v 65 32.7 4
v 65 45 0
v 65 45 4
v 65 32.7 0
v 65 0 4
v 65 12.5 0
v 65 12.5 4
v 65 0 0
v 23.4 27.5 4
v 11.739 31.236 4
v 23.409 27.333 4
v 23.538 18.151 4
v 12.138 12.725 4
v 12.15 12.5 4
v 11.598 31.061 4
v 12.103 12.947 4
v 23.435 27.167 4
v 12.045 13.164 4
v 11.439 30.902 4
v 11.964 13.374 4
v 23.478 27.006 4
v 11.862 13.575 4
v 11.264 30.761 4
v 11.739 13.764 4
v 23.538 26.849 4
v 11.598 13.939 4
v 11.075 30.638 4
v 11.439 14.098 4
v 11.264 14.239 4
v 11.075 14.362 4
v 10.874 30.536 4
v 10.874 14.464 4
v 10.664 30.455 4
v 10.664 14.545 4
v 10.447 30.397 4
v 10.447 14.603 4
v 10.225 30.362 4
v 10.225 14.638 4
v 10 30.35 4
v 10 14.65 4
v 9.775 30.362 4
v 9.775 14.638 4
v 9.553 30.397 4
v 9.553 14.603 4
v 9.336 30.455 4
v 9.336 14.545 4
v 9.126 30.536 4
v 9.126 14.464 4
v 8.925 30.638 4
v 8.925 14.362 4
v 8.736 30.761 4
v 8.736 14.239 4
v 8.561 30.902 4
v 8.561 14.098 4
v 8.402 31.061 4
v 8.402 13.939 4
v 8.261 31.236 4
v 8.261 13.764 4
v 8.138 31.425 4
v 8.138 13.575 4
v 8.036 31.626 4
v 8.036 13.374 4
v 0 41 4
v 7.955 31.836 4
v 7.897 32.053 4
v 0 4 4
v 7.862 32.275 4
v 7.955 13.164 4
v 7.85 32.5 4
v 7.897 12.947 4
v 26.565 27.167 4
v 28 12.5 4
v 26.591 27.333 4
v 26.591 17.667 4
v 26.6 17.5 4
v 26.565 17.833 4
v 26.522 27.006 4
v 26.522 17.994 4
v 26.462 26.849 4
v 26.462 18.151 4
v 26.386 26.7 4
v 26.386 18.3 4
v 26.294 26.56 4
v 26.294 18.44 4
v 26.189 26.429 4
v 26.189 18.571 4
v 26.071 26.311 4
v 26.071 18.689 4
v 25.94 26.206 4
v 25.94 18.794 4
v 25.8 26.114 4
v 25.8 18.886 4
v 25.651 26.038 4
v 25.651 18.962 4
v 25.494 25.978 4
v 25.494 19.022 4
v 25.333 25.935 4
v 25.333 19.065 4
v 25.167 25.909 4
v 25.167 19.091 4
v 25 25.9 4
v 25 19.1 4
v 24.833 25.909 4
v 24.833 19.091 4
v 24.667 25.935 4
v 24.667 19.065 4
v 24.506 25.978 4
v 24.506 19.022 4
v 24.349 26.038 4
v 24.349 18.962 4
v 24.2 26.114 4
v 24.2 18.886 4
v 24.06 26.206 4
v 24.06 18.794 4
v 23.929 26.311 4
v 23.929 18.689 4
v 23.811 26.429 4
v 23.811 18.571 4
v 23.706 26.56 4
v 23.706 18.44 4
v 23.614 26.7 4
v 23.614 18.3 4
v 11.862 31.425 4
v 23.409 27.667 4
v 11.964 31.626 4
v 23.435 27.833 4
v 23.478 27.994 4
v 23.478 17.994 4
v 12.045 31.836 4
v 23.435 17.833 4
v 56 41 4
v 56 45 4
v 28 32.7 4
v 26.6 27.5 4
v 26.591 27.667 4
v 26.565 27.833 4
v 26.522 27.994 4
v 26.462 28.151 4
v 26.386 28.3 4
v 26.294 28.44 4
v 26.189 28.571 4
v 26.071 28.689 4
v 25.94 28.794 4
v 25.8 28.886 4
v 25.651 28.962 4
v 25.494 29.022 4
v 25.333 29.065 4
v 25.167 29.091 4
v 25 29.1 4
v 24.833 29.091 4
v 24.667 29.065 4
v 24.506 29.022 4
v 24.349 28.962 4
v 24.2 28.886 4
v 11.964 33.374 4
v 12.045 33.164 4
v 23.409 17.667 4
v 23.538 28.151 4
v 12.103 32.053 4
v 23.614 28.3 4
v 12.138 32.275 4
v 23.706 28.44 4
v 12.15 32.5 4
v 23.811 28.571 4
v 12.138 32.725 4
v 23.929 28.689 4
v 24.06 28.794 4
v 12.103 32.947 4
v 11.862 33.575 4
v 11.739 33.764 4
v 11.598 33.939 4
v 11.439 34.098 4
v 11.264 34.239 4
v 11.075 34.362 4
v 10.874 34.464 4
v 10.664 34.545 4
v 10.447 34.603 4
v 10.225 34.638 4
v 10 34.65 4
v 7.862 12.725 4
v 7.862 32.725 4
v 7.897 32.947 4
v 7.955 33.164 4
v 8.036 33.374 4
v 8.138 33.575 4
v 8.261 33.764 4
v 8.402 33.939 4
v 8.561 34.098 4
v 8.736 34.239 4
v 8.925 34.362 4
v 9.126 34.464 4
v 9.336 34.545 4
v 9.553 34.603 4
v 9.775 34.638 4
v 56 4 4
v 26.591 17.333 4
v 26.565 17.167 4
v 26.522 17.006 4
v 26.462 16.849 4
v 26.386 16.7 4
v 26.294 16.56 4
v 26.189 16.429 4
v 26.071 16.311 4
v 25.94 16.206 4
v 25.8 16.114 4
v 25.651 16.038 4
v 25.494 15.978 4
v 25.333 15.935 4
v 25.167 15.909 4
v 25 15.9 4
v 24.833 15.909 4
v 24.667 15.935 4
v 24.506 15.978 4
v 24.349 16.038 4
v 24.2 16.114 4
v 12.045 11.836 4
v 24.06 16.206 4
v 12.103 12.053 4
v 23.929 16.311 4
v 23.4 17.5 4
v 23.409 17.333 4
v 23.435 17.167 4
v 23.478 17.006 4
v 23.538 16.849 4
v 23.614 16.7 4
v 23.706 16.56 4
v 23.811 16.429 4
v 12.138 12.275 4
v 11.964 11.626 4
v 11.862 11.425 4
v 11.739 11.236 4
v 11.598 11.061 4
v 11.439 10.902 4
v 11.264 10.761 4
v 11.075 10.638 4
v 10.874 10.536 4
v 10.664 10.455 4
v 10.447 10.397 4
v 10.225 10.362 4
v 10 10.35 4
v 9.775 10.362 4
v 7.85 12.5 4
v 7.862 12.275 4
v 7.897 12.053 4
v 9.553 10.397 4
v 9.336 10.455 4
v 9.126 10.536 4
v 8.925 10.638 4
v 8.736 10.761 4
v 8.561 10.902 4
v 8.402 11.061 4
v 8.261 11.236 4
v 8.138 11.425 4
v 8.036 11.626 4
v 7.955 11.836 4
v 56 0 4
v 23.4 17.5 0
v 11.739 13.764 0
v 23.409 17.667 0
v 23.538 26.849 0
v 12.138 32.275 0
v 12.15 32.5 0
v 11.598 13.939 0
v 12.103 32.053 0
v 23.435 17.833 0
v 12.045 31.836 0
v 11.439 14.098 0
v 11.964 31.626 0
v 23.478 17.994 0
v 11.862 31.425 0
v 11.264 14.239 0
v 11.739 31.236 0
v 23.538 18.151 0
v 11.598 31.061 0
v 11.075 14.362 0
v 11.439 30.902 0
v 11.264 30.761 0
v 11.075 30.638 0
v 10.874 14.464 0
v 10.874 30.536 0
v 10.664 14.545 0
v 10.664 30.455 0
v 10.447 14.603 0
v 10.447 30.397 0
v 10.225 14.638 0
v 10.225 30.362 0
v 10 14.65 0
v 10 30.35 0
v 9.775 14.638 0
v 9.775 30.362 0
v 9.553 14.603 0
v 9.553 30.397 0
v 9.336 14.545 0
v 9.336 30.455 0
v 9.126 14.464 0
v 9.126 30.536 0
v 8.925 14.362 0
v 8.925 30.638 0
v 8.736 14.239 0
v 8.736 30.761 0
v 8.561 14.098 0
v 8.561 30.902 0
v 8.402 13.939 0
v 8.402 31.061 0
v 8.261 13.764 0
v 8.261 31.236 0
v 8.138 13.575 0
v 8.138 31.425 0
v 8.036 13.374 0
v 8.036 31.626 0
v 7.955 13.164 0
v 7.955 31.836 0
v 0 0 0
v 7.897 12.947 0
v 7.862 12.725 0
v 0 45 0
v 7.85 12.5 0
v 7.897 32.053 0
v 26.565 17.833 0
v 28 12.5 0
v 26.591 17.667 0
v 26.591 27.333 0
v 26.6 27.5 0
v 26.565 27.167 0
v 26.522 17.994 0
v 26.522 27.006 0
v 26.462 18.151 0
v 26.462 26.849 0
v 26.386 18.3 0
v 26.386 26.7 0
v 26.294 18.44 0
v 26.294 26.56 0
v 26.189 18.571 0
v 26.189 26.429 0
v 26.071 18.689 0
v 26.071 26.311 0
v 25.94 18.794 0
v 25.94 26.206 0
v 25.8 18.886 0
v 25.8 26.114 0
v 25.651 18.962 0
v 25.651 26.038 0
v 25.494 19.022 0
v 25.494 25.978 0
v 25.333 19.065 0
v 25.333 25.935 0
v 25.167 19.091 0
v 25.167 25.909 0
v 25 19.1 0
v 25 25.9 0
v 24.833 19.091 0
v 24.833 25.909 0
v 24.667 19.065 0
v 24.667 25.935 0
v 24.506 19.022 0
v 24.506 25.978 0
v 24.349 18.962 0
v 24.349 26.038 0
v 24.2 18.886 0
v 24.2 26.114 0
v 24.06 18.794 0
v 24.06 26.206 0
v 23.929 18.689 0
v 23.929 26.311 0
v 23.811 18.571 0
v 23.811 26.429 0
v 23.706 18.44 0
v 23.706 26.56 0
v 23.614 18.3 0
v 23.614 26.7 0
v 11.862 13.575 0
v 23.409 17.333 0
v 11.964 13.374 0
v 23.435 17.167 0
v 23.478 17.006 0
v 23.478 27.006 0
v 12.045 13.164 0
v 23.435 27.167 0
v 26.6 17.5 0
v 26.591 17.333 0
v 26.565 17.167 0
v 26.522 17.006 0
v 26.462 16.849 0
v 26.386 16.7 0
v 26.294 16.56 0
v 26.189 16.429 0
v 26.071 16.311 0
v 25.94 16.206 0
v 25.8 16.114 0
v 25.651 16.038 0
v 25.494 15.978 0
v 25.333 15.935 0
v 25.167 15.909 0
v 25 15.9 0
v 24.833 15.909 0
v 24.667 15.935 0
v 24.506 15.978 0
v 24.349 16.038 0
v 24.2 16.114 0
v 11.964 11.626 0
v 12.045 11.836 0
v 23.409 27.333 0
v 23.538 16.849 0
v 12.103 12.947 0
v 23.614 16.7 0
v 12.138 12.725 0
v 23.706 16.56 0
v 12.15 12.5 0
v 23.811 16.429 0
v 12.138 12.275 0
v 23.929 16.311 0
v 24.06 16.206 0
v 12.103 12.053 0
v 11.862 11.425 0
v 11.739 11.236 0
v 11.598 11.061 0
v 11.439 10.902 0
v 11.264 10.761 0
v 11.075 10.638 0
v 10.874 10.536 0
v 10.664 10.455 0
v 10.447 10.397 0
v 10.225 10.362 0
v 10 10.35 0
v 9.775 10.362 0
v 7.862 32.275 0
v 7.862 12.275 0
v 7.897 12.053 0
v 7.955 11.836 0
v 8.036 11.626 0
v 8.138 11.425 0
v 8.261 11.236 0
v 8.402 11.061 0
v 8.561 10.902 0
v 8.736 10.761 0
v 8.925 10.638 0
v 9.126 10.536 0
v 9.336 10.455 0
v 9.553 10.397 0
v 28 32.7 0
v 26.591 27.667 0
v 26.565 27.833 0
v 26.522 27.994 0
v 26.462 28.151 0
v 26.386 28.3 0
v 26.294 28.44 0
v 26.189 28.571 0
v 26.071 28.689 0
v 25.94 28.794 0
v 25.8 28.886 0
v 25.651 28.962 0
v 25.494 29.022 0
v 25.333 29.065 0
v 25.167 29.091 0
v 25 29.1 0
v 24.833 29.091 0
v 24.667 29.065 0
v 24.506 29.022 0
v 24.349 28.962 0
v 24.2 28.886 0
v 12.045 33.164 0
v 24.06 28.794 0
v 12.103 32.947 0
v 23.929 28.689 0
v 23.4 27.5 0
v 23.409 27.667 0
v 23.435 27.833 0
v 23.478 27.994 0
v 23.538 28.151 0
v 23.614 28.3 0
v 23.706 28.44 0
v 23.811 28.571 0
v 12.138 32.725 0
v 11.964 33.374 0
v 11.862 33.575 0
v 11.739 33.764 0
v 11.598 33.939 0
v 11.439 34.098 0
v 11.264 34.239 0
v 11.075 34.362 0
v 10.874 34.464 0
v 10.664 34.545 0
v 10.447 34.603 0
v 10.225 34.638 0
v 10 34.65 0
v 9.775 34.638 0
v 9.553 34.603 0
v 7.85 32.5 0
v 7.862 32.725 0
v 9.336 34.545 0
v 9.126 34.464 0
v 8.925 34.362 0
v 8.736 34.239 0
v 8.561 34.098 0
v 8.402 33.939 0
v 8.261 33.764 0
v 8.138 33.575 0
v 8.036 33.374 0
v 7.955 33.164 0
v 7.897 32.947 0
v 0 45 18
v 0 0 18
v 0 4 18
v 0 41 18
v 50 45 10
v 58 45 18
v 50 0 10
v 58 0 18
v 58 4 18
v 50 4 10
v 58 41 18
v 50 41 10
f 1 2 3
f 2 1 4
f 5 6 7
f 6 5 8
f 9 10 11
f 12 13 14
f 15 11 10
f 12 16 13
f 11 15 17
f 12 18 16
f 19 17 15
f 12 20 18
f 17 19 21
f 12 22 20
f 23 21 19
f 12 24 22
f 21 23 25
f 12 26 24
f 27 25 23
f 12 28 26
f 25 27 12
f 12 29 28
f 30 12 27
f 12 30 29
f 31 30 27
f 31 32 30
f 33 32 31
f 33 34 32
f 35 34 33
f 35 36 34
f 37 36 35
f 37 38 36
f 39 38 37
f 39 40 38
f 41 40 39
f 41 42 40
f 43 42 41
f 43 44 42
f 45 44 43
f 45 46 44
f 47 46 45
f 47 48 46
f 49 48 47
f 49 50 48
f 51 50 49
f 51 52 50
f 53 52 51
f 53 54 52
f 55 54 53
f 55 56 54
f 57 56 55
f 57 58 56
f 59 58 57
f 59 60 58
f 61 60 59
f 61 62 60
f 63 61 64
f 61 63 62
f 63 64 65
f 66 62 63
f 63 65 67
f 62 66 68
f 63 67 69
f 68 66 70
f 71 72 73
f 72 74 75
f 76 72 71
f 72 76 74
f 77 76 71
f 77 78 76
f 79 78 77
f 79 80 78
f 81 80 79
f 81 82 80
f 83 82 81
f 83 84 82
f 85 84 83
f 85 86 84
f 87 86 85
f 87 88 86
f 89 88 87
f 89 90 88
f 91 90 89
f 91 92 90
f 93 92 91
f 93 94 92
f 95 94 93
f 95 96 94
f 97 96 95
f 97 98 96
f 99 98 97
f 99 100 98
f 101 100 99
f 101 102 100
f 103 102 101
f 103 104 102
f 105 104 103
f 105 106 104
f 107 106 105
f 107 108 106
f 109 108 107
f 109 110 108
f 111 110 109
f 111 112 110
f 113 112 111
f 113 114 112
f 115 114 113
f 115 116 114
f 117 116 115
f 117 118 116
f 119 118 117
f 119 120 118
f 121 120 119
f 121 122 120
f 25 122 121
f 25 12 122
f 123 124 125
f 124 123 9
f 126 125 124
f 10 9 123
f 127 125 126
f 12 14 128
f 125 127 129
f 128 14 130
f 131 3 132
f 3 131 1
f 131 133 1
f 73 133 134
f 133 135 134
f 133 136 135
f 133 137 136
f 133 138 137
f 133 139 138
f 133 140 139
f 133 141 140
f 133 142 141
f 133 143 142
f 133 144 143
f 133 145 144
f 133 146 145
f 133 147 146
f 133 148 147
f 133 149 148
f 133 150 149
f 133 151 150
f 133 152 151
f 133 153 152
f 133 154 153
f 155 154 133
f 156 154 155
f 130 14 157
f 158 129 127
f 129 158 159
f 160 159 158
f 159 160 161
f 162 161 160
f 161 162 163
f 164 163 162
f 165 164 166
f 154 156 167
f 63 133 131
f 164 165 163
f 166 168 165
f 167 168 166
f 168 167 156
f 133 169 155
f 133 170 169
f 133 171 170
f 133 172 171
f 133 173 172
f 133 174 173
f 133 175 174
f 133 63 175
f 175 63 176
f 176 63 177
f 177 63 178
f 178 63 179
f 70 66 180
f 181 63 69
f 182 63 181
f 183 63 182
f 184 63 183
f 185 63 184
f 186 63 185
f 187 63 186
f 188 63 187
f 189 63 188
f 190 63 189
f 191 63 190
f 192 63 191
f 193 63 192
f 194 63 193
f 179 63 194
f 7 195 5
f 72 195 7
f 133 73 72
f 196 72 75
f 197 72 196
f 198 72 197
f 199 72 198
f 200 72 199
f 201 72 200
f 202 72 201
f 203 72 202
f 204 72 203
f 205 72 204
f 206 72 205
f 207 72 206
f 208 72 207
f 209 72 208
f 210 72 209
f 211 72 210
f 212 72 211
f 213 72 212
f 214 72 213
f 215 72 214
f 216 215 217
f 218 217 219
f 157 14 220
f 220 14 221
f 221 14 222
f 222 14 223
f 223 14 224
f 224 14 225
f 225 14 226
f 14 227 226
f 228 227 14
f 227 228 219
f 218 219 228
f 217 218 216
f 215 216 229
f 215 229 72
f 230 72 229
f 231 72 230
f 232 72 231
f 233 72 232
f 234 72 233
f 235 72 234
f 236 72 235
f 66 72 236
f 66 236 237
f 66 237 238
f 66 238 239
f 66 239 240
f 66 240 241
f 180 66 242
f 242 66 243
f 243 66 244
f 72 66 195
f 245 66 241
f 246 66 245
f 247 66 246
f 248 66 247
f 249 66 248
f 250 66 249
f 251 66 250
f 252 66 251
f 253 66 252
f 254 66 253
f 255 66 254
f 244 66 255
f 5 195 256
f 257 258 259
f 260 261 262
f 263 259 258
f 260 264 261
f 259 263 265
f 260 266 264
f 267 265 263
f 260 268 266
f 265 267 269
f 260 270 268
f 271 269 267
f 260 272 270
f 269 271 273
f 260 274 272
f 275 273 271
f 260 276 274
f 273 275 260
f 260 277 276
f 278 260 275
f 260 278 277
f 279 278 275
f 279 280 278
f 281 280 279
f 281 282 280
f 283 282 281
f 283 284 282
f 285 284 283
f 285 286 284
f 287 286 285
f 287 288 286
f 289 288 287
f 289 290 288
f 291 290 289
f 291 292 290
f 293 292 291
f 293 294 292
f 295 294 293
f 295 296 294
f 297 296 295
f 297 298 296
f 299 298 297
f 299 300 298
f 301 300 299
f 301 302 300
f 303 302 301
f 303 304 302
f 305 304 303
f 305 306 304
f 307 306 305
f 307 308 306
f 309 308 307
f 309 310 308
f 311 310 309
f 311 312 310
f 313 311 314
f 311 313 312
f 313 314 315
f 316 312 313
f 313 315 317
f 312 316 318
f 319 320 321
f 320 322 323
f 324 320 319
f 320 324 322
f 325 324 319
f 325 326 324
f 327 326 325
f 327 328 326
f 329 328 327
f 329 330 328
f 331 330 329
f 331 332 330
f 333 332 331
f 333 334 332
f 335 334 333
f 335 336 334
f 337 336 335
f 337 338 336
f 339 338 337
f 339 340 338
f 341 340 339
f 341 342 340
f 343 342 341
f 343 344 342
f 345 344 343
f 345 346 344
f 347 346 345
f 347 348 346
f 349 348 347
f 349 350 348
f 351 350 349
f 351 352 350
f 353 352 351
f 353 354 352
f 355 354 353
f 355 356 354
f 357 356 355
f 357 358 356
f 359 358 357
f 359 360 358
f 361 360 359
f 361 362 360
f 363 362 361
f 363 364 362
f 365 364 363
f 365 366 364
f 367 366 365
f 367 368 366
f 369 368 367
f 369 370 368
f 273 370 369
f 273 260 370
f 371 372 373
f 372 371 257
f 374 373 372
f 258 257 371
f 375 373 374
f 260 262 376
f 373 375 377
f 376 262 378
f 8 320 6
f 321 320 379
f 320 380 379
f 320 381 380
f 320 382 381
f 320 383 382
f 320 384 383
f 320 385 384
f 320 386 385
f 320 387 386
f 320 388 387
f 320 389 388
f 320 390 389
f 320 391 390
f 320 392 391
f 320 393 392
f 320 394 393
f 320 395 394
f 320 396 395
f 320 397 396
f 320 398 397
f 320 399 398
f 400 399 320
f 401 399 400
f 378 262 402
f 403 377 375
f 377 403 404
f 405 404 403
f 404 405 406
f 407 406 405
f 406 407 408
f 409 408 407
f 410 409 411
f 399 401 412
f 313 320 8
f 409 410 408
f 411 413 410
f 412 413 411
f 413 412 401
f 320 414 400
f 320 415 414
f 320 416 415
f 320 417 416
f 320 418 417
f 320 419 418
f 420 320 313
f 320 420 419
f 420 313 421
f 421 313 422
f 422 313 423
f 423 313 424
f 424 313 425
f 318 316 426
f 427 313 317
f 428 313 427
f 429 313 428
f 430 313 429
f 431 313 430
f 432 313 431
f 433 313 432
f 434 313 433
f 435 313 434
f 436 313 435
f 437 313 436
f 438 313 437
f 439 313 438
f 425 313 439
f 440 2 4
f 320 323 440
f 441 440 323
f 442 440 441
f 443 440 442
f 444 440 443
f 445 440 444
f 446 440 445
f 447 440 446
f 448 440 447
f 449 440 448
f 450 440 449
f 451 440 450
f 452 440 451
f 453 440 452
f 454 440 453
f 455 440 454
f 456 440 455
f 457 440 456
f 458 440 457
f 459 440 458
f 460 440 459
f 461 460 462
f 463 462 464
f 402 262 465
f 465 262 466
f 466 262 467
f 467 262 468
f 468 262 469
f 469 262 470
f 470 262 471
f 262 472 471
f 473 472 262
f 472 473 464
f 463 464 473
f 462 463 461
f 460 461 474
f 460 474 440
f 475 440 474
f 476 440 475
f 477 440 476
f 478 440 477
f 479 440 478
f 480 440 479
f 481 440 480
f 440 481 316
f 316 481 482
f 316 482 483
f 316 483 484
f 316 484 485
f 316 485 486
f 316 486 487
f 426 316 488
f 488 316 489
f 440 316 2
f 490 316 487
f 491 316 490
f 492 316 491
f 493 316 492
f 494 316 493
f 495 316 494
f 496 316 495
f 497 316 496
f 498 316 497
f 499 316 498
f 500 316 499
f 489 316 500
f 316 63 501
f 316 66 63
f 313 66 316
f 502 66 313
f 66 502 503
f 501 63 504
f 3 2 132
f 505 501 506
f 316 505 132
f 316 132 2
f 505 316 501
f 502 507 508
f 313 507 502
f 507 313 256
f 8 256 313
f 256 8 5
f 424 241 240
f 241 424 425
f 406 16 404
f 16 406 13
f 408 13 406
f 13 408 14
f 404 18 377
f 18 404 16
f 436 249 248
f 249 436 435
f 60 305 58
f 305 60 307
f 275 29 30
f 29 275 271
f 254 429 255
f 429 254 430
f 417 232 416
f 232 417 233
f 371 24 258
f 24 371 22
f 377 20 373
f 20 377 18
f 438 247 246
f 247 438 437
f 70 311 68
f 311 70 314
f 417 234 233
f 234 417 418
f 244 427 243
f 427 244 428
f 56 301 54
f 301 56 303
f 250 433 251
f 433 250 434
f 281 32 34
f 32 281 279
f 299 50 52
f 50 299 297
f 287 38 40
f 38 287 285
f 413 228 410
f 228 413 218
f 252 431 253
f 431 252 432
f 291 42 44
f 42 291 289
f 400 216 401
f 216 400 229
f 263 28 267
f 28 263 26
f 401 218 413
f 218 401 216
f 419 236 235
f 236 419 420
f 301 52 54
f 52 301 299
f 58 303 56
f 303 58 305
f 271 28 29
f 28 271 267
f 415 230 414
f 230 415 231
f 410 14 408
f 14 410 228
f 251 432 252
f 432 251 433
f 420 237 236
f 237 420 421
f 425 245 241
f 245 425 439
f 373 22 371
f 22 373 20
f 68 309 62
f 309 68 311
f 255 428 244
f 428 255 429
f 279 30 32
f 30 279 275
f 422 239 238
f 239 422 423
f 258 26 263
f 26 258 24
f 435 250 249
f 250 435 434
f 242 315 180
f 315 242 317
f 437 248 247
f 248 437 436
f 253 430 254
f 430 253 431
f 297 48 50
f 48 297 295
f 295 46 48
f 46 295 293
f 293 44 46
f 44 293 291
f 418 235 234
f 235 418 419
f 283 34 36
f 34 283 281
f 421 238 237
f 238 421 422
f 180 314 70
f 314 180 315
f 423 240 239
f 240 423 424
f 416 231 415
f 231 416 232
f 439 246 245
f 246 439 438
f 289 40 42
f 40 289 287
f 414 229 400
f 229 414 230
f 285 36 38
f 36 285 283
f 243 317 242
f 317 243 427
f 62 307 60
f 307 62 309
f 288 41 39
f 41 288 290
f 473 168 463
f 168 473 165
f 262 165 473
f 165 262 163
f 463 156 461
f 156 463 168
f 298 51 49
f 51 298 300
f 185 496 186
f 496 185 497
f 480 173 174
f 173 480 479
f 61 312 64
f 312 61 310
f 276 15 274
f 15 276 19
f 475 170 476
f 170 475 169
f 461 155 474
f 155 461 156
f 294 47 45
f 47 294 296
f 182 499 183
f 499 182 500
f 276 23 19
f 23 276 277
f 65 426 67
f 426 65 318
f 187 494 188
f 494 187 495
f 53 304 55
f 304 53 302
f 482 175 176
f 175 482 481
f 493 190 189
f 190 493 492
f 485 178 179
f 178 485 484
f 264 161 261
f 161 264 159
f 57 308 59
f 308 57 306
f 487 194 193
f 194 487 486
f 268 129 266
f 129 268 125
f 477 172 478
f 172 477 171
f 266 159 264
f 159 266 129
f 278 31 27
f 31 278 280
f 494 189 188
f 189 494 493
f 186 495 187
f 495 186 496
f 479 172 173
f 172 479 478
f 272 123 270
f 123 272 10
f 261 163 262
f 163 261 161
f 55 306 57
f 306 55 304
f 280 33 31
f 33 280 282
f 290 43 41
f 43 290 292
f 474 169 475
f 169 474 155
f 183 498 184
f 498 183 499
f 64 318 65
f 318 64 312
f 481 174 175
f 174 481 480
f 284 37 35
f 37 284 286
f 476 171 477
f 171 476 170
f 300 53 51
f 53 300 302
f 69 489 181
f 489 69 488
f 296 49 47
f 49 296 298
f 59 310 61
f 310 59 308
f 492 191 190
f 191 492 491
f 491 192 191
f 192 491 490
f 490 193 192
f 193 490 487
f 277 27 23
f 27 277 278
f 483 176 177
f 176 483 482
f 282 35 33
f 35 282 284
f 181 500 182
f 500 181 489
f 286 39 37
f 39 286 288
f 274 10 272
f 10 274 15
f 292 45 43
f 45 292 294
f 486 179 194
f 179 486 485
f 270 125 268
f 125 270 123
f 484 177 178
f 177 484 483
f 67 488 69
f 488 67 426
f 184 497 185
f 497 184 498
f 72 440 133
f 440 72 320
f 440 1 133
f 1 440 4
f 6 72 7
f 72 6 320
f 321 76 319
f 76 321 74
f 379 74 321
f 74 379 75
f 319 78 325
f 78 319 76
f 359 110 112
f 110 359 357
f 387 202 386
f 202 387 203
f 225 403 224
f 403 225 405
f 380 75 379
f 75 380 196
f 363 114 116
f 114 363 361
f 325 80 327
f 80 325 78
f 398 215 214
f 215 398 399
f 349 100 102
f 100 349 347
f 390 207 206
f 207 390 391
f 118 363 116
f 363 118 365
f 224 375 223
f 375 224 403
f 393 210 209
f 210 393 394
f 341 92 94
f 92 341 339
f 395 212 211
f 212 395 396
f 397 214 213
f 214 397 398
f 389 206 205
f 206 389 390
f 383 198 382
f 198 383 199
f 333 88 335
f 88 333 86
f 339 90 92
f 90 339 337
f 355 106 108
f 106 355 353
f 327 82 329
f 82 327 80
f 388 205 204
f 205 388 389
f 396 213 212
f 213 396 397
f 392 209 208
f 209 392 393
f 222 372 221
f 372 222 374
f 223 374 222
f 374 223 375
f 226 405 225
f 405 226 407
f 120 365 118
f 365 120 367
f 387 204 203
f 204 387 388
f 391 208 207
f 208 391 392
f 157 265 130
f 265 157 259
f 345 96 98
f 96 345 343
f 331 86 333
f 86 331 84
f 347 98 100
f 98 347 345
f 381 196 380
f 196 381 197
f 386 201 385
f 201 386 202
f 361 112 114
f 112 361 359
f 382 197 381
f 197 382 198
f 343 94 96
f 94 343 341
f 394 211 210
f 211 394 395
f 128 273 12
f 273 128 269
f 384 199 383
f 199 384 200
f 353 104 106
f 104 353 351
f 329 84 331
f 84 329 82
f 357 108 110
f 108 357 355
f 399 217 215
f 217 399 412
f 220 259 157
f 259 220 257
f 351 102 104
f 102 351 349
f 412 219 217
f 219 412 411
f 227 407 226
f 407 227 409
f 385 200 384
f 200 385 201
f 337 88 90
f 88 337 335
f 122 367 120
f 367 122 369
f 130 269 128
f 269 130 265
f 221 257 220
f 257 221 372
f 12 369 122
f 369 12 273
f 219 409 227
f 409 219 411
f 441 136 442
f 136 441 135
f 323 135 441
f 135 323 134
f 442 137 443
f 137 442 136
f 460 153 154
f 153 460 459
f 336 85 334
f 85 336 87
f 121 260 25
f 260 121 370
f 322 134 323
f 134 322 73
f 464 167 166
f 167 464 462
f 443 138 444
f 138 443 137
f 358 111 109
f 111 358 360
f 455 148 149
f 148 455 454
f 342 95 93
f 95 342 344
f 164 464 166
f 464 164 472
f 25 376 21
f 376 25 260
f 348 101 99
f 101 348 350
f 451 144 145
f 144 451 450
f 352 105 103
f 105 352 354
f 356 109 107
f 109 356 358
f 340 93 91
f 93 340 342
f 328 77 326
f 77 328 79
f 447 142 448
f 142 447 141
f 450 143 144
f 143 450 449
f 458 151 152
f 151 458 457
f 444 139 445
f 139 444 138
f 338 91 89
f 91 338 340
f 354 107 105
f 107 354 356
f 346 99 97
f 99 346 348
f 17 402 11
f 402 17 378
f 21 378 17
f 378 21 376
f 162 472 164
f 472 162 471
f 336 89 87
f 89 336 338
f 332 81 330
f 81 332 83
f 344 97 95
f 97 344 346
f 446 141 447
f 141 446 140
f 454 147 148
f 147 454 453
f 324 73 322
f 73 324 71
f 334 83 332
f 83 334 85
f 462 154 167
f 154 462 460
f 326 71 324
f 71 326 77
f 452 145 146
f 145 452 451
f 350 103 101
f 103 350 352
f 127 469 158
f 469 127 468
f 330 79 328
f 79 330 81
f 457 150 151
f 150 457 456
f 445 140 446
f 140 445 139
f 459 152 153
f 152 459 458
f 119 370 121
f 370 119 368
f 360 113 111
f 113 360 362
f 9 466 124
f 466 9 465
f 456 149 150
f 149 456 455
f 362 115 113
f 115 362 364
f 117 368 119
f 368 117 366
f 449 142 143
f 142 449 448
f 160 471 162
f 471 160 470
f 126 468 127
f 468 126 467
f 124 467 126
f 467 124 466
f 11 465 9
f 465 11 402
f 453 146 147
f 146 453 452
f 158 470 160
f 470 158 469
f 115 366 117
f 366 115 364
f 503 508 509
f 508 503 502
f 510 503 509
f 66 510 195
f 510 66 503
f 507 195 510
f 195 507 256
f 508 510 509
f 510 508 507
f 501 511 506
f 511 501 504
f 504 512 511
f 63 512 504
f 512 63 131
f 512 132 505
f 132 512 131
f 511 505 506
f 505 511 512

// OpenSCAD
// Sıfır Atık YZ - MG996R Servo ve Mekanik Ayrıştırıcı Flap Montaj Braketi
// 2020 Alüminyum Sigma Profile ve MG996R metal dişli servoya tam uyumludur.
// OpenSCAD ile düzenlenebilir veya STL formatına ihraç edilip 3D yazıcıdan basılabilir.

$fn = 60;

// Ana Parametreler (mm)
bracket_width = 45;
bracket_length = 65;
bracket_thickness = 4;
profile_slot_distance = 20;

module base_plate() {
    difference() {
        cube([bracket_length, bracket_width, bracket_thickness], center = false);
        
        // 2020 Sigma Profil Montaj Delikleri (M4 Cıvata)
        translate([10, bracket_width/2 - profile_slot_distance/2, -1])
            cylinder(h = bracket_thickness + 2, d = 4.3);
        translate([10, bracket_width/2 + profile_slot_distance/2, -1])
            cylinder(h = bracket_thickness + 2, d = 4.3);
            
        // MG996R Servo Gövde Yuvası (40.5mm x 20mm)
        translate([28, bracket_width/2 - 10, -1])
            cube([40.5, 20.2, bracket_thickness + 2]);
            
        // Servo Sabitleme Kulak Delikleri (M3 Cıvata)
        translate([25, bracket_width/2 - 5, -1])
            cylinder(h = bracket_thickness + 2, d = 3.2);
        translate([25, bracket_width/2 + 5, -1])
            cylinder(h = bracket_thickness + 2, d = 3.2);
        translate([28 + 40.5 + 3, bracket_width/2 - 5, -1])
            cylinder(h = bracket_thickness + 2, d = 3.2);
        translate([28 + 40.5 + 3, bracket_width/2 + 5, -1])
            cylinder(h = bracket_thickness + 2, d = 3.2);
    }
}

module side_support() {
    difference() {
        cube([bracket_length, 4, 18]);
        translate([bracket_length - 15, -1, 10])
            rotate([0, 45, 0])
                cube([25, 6, 25]);
    }
}

// Montaj
union() {
    base_plate();
    translate([0, 0, 0]) side_support();
    translate([0, bracket_width - 4, 0]) side_support();
}
